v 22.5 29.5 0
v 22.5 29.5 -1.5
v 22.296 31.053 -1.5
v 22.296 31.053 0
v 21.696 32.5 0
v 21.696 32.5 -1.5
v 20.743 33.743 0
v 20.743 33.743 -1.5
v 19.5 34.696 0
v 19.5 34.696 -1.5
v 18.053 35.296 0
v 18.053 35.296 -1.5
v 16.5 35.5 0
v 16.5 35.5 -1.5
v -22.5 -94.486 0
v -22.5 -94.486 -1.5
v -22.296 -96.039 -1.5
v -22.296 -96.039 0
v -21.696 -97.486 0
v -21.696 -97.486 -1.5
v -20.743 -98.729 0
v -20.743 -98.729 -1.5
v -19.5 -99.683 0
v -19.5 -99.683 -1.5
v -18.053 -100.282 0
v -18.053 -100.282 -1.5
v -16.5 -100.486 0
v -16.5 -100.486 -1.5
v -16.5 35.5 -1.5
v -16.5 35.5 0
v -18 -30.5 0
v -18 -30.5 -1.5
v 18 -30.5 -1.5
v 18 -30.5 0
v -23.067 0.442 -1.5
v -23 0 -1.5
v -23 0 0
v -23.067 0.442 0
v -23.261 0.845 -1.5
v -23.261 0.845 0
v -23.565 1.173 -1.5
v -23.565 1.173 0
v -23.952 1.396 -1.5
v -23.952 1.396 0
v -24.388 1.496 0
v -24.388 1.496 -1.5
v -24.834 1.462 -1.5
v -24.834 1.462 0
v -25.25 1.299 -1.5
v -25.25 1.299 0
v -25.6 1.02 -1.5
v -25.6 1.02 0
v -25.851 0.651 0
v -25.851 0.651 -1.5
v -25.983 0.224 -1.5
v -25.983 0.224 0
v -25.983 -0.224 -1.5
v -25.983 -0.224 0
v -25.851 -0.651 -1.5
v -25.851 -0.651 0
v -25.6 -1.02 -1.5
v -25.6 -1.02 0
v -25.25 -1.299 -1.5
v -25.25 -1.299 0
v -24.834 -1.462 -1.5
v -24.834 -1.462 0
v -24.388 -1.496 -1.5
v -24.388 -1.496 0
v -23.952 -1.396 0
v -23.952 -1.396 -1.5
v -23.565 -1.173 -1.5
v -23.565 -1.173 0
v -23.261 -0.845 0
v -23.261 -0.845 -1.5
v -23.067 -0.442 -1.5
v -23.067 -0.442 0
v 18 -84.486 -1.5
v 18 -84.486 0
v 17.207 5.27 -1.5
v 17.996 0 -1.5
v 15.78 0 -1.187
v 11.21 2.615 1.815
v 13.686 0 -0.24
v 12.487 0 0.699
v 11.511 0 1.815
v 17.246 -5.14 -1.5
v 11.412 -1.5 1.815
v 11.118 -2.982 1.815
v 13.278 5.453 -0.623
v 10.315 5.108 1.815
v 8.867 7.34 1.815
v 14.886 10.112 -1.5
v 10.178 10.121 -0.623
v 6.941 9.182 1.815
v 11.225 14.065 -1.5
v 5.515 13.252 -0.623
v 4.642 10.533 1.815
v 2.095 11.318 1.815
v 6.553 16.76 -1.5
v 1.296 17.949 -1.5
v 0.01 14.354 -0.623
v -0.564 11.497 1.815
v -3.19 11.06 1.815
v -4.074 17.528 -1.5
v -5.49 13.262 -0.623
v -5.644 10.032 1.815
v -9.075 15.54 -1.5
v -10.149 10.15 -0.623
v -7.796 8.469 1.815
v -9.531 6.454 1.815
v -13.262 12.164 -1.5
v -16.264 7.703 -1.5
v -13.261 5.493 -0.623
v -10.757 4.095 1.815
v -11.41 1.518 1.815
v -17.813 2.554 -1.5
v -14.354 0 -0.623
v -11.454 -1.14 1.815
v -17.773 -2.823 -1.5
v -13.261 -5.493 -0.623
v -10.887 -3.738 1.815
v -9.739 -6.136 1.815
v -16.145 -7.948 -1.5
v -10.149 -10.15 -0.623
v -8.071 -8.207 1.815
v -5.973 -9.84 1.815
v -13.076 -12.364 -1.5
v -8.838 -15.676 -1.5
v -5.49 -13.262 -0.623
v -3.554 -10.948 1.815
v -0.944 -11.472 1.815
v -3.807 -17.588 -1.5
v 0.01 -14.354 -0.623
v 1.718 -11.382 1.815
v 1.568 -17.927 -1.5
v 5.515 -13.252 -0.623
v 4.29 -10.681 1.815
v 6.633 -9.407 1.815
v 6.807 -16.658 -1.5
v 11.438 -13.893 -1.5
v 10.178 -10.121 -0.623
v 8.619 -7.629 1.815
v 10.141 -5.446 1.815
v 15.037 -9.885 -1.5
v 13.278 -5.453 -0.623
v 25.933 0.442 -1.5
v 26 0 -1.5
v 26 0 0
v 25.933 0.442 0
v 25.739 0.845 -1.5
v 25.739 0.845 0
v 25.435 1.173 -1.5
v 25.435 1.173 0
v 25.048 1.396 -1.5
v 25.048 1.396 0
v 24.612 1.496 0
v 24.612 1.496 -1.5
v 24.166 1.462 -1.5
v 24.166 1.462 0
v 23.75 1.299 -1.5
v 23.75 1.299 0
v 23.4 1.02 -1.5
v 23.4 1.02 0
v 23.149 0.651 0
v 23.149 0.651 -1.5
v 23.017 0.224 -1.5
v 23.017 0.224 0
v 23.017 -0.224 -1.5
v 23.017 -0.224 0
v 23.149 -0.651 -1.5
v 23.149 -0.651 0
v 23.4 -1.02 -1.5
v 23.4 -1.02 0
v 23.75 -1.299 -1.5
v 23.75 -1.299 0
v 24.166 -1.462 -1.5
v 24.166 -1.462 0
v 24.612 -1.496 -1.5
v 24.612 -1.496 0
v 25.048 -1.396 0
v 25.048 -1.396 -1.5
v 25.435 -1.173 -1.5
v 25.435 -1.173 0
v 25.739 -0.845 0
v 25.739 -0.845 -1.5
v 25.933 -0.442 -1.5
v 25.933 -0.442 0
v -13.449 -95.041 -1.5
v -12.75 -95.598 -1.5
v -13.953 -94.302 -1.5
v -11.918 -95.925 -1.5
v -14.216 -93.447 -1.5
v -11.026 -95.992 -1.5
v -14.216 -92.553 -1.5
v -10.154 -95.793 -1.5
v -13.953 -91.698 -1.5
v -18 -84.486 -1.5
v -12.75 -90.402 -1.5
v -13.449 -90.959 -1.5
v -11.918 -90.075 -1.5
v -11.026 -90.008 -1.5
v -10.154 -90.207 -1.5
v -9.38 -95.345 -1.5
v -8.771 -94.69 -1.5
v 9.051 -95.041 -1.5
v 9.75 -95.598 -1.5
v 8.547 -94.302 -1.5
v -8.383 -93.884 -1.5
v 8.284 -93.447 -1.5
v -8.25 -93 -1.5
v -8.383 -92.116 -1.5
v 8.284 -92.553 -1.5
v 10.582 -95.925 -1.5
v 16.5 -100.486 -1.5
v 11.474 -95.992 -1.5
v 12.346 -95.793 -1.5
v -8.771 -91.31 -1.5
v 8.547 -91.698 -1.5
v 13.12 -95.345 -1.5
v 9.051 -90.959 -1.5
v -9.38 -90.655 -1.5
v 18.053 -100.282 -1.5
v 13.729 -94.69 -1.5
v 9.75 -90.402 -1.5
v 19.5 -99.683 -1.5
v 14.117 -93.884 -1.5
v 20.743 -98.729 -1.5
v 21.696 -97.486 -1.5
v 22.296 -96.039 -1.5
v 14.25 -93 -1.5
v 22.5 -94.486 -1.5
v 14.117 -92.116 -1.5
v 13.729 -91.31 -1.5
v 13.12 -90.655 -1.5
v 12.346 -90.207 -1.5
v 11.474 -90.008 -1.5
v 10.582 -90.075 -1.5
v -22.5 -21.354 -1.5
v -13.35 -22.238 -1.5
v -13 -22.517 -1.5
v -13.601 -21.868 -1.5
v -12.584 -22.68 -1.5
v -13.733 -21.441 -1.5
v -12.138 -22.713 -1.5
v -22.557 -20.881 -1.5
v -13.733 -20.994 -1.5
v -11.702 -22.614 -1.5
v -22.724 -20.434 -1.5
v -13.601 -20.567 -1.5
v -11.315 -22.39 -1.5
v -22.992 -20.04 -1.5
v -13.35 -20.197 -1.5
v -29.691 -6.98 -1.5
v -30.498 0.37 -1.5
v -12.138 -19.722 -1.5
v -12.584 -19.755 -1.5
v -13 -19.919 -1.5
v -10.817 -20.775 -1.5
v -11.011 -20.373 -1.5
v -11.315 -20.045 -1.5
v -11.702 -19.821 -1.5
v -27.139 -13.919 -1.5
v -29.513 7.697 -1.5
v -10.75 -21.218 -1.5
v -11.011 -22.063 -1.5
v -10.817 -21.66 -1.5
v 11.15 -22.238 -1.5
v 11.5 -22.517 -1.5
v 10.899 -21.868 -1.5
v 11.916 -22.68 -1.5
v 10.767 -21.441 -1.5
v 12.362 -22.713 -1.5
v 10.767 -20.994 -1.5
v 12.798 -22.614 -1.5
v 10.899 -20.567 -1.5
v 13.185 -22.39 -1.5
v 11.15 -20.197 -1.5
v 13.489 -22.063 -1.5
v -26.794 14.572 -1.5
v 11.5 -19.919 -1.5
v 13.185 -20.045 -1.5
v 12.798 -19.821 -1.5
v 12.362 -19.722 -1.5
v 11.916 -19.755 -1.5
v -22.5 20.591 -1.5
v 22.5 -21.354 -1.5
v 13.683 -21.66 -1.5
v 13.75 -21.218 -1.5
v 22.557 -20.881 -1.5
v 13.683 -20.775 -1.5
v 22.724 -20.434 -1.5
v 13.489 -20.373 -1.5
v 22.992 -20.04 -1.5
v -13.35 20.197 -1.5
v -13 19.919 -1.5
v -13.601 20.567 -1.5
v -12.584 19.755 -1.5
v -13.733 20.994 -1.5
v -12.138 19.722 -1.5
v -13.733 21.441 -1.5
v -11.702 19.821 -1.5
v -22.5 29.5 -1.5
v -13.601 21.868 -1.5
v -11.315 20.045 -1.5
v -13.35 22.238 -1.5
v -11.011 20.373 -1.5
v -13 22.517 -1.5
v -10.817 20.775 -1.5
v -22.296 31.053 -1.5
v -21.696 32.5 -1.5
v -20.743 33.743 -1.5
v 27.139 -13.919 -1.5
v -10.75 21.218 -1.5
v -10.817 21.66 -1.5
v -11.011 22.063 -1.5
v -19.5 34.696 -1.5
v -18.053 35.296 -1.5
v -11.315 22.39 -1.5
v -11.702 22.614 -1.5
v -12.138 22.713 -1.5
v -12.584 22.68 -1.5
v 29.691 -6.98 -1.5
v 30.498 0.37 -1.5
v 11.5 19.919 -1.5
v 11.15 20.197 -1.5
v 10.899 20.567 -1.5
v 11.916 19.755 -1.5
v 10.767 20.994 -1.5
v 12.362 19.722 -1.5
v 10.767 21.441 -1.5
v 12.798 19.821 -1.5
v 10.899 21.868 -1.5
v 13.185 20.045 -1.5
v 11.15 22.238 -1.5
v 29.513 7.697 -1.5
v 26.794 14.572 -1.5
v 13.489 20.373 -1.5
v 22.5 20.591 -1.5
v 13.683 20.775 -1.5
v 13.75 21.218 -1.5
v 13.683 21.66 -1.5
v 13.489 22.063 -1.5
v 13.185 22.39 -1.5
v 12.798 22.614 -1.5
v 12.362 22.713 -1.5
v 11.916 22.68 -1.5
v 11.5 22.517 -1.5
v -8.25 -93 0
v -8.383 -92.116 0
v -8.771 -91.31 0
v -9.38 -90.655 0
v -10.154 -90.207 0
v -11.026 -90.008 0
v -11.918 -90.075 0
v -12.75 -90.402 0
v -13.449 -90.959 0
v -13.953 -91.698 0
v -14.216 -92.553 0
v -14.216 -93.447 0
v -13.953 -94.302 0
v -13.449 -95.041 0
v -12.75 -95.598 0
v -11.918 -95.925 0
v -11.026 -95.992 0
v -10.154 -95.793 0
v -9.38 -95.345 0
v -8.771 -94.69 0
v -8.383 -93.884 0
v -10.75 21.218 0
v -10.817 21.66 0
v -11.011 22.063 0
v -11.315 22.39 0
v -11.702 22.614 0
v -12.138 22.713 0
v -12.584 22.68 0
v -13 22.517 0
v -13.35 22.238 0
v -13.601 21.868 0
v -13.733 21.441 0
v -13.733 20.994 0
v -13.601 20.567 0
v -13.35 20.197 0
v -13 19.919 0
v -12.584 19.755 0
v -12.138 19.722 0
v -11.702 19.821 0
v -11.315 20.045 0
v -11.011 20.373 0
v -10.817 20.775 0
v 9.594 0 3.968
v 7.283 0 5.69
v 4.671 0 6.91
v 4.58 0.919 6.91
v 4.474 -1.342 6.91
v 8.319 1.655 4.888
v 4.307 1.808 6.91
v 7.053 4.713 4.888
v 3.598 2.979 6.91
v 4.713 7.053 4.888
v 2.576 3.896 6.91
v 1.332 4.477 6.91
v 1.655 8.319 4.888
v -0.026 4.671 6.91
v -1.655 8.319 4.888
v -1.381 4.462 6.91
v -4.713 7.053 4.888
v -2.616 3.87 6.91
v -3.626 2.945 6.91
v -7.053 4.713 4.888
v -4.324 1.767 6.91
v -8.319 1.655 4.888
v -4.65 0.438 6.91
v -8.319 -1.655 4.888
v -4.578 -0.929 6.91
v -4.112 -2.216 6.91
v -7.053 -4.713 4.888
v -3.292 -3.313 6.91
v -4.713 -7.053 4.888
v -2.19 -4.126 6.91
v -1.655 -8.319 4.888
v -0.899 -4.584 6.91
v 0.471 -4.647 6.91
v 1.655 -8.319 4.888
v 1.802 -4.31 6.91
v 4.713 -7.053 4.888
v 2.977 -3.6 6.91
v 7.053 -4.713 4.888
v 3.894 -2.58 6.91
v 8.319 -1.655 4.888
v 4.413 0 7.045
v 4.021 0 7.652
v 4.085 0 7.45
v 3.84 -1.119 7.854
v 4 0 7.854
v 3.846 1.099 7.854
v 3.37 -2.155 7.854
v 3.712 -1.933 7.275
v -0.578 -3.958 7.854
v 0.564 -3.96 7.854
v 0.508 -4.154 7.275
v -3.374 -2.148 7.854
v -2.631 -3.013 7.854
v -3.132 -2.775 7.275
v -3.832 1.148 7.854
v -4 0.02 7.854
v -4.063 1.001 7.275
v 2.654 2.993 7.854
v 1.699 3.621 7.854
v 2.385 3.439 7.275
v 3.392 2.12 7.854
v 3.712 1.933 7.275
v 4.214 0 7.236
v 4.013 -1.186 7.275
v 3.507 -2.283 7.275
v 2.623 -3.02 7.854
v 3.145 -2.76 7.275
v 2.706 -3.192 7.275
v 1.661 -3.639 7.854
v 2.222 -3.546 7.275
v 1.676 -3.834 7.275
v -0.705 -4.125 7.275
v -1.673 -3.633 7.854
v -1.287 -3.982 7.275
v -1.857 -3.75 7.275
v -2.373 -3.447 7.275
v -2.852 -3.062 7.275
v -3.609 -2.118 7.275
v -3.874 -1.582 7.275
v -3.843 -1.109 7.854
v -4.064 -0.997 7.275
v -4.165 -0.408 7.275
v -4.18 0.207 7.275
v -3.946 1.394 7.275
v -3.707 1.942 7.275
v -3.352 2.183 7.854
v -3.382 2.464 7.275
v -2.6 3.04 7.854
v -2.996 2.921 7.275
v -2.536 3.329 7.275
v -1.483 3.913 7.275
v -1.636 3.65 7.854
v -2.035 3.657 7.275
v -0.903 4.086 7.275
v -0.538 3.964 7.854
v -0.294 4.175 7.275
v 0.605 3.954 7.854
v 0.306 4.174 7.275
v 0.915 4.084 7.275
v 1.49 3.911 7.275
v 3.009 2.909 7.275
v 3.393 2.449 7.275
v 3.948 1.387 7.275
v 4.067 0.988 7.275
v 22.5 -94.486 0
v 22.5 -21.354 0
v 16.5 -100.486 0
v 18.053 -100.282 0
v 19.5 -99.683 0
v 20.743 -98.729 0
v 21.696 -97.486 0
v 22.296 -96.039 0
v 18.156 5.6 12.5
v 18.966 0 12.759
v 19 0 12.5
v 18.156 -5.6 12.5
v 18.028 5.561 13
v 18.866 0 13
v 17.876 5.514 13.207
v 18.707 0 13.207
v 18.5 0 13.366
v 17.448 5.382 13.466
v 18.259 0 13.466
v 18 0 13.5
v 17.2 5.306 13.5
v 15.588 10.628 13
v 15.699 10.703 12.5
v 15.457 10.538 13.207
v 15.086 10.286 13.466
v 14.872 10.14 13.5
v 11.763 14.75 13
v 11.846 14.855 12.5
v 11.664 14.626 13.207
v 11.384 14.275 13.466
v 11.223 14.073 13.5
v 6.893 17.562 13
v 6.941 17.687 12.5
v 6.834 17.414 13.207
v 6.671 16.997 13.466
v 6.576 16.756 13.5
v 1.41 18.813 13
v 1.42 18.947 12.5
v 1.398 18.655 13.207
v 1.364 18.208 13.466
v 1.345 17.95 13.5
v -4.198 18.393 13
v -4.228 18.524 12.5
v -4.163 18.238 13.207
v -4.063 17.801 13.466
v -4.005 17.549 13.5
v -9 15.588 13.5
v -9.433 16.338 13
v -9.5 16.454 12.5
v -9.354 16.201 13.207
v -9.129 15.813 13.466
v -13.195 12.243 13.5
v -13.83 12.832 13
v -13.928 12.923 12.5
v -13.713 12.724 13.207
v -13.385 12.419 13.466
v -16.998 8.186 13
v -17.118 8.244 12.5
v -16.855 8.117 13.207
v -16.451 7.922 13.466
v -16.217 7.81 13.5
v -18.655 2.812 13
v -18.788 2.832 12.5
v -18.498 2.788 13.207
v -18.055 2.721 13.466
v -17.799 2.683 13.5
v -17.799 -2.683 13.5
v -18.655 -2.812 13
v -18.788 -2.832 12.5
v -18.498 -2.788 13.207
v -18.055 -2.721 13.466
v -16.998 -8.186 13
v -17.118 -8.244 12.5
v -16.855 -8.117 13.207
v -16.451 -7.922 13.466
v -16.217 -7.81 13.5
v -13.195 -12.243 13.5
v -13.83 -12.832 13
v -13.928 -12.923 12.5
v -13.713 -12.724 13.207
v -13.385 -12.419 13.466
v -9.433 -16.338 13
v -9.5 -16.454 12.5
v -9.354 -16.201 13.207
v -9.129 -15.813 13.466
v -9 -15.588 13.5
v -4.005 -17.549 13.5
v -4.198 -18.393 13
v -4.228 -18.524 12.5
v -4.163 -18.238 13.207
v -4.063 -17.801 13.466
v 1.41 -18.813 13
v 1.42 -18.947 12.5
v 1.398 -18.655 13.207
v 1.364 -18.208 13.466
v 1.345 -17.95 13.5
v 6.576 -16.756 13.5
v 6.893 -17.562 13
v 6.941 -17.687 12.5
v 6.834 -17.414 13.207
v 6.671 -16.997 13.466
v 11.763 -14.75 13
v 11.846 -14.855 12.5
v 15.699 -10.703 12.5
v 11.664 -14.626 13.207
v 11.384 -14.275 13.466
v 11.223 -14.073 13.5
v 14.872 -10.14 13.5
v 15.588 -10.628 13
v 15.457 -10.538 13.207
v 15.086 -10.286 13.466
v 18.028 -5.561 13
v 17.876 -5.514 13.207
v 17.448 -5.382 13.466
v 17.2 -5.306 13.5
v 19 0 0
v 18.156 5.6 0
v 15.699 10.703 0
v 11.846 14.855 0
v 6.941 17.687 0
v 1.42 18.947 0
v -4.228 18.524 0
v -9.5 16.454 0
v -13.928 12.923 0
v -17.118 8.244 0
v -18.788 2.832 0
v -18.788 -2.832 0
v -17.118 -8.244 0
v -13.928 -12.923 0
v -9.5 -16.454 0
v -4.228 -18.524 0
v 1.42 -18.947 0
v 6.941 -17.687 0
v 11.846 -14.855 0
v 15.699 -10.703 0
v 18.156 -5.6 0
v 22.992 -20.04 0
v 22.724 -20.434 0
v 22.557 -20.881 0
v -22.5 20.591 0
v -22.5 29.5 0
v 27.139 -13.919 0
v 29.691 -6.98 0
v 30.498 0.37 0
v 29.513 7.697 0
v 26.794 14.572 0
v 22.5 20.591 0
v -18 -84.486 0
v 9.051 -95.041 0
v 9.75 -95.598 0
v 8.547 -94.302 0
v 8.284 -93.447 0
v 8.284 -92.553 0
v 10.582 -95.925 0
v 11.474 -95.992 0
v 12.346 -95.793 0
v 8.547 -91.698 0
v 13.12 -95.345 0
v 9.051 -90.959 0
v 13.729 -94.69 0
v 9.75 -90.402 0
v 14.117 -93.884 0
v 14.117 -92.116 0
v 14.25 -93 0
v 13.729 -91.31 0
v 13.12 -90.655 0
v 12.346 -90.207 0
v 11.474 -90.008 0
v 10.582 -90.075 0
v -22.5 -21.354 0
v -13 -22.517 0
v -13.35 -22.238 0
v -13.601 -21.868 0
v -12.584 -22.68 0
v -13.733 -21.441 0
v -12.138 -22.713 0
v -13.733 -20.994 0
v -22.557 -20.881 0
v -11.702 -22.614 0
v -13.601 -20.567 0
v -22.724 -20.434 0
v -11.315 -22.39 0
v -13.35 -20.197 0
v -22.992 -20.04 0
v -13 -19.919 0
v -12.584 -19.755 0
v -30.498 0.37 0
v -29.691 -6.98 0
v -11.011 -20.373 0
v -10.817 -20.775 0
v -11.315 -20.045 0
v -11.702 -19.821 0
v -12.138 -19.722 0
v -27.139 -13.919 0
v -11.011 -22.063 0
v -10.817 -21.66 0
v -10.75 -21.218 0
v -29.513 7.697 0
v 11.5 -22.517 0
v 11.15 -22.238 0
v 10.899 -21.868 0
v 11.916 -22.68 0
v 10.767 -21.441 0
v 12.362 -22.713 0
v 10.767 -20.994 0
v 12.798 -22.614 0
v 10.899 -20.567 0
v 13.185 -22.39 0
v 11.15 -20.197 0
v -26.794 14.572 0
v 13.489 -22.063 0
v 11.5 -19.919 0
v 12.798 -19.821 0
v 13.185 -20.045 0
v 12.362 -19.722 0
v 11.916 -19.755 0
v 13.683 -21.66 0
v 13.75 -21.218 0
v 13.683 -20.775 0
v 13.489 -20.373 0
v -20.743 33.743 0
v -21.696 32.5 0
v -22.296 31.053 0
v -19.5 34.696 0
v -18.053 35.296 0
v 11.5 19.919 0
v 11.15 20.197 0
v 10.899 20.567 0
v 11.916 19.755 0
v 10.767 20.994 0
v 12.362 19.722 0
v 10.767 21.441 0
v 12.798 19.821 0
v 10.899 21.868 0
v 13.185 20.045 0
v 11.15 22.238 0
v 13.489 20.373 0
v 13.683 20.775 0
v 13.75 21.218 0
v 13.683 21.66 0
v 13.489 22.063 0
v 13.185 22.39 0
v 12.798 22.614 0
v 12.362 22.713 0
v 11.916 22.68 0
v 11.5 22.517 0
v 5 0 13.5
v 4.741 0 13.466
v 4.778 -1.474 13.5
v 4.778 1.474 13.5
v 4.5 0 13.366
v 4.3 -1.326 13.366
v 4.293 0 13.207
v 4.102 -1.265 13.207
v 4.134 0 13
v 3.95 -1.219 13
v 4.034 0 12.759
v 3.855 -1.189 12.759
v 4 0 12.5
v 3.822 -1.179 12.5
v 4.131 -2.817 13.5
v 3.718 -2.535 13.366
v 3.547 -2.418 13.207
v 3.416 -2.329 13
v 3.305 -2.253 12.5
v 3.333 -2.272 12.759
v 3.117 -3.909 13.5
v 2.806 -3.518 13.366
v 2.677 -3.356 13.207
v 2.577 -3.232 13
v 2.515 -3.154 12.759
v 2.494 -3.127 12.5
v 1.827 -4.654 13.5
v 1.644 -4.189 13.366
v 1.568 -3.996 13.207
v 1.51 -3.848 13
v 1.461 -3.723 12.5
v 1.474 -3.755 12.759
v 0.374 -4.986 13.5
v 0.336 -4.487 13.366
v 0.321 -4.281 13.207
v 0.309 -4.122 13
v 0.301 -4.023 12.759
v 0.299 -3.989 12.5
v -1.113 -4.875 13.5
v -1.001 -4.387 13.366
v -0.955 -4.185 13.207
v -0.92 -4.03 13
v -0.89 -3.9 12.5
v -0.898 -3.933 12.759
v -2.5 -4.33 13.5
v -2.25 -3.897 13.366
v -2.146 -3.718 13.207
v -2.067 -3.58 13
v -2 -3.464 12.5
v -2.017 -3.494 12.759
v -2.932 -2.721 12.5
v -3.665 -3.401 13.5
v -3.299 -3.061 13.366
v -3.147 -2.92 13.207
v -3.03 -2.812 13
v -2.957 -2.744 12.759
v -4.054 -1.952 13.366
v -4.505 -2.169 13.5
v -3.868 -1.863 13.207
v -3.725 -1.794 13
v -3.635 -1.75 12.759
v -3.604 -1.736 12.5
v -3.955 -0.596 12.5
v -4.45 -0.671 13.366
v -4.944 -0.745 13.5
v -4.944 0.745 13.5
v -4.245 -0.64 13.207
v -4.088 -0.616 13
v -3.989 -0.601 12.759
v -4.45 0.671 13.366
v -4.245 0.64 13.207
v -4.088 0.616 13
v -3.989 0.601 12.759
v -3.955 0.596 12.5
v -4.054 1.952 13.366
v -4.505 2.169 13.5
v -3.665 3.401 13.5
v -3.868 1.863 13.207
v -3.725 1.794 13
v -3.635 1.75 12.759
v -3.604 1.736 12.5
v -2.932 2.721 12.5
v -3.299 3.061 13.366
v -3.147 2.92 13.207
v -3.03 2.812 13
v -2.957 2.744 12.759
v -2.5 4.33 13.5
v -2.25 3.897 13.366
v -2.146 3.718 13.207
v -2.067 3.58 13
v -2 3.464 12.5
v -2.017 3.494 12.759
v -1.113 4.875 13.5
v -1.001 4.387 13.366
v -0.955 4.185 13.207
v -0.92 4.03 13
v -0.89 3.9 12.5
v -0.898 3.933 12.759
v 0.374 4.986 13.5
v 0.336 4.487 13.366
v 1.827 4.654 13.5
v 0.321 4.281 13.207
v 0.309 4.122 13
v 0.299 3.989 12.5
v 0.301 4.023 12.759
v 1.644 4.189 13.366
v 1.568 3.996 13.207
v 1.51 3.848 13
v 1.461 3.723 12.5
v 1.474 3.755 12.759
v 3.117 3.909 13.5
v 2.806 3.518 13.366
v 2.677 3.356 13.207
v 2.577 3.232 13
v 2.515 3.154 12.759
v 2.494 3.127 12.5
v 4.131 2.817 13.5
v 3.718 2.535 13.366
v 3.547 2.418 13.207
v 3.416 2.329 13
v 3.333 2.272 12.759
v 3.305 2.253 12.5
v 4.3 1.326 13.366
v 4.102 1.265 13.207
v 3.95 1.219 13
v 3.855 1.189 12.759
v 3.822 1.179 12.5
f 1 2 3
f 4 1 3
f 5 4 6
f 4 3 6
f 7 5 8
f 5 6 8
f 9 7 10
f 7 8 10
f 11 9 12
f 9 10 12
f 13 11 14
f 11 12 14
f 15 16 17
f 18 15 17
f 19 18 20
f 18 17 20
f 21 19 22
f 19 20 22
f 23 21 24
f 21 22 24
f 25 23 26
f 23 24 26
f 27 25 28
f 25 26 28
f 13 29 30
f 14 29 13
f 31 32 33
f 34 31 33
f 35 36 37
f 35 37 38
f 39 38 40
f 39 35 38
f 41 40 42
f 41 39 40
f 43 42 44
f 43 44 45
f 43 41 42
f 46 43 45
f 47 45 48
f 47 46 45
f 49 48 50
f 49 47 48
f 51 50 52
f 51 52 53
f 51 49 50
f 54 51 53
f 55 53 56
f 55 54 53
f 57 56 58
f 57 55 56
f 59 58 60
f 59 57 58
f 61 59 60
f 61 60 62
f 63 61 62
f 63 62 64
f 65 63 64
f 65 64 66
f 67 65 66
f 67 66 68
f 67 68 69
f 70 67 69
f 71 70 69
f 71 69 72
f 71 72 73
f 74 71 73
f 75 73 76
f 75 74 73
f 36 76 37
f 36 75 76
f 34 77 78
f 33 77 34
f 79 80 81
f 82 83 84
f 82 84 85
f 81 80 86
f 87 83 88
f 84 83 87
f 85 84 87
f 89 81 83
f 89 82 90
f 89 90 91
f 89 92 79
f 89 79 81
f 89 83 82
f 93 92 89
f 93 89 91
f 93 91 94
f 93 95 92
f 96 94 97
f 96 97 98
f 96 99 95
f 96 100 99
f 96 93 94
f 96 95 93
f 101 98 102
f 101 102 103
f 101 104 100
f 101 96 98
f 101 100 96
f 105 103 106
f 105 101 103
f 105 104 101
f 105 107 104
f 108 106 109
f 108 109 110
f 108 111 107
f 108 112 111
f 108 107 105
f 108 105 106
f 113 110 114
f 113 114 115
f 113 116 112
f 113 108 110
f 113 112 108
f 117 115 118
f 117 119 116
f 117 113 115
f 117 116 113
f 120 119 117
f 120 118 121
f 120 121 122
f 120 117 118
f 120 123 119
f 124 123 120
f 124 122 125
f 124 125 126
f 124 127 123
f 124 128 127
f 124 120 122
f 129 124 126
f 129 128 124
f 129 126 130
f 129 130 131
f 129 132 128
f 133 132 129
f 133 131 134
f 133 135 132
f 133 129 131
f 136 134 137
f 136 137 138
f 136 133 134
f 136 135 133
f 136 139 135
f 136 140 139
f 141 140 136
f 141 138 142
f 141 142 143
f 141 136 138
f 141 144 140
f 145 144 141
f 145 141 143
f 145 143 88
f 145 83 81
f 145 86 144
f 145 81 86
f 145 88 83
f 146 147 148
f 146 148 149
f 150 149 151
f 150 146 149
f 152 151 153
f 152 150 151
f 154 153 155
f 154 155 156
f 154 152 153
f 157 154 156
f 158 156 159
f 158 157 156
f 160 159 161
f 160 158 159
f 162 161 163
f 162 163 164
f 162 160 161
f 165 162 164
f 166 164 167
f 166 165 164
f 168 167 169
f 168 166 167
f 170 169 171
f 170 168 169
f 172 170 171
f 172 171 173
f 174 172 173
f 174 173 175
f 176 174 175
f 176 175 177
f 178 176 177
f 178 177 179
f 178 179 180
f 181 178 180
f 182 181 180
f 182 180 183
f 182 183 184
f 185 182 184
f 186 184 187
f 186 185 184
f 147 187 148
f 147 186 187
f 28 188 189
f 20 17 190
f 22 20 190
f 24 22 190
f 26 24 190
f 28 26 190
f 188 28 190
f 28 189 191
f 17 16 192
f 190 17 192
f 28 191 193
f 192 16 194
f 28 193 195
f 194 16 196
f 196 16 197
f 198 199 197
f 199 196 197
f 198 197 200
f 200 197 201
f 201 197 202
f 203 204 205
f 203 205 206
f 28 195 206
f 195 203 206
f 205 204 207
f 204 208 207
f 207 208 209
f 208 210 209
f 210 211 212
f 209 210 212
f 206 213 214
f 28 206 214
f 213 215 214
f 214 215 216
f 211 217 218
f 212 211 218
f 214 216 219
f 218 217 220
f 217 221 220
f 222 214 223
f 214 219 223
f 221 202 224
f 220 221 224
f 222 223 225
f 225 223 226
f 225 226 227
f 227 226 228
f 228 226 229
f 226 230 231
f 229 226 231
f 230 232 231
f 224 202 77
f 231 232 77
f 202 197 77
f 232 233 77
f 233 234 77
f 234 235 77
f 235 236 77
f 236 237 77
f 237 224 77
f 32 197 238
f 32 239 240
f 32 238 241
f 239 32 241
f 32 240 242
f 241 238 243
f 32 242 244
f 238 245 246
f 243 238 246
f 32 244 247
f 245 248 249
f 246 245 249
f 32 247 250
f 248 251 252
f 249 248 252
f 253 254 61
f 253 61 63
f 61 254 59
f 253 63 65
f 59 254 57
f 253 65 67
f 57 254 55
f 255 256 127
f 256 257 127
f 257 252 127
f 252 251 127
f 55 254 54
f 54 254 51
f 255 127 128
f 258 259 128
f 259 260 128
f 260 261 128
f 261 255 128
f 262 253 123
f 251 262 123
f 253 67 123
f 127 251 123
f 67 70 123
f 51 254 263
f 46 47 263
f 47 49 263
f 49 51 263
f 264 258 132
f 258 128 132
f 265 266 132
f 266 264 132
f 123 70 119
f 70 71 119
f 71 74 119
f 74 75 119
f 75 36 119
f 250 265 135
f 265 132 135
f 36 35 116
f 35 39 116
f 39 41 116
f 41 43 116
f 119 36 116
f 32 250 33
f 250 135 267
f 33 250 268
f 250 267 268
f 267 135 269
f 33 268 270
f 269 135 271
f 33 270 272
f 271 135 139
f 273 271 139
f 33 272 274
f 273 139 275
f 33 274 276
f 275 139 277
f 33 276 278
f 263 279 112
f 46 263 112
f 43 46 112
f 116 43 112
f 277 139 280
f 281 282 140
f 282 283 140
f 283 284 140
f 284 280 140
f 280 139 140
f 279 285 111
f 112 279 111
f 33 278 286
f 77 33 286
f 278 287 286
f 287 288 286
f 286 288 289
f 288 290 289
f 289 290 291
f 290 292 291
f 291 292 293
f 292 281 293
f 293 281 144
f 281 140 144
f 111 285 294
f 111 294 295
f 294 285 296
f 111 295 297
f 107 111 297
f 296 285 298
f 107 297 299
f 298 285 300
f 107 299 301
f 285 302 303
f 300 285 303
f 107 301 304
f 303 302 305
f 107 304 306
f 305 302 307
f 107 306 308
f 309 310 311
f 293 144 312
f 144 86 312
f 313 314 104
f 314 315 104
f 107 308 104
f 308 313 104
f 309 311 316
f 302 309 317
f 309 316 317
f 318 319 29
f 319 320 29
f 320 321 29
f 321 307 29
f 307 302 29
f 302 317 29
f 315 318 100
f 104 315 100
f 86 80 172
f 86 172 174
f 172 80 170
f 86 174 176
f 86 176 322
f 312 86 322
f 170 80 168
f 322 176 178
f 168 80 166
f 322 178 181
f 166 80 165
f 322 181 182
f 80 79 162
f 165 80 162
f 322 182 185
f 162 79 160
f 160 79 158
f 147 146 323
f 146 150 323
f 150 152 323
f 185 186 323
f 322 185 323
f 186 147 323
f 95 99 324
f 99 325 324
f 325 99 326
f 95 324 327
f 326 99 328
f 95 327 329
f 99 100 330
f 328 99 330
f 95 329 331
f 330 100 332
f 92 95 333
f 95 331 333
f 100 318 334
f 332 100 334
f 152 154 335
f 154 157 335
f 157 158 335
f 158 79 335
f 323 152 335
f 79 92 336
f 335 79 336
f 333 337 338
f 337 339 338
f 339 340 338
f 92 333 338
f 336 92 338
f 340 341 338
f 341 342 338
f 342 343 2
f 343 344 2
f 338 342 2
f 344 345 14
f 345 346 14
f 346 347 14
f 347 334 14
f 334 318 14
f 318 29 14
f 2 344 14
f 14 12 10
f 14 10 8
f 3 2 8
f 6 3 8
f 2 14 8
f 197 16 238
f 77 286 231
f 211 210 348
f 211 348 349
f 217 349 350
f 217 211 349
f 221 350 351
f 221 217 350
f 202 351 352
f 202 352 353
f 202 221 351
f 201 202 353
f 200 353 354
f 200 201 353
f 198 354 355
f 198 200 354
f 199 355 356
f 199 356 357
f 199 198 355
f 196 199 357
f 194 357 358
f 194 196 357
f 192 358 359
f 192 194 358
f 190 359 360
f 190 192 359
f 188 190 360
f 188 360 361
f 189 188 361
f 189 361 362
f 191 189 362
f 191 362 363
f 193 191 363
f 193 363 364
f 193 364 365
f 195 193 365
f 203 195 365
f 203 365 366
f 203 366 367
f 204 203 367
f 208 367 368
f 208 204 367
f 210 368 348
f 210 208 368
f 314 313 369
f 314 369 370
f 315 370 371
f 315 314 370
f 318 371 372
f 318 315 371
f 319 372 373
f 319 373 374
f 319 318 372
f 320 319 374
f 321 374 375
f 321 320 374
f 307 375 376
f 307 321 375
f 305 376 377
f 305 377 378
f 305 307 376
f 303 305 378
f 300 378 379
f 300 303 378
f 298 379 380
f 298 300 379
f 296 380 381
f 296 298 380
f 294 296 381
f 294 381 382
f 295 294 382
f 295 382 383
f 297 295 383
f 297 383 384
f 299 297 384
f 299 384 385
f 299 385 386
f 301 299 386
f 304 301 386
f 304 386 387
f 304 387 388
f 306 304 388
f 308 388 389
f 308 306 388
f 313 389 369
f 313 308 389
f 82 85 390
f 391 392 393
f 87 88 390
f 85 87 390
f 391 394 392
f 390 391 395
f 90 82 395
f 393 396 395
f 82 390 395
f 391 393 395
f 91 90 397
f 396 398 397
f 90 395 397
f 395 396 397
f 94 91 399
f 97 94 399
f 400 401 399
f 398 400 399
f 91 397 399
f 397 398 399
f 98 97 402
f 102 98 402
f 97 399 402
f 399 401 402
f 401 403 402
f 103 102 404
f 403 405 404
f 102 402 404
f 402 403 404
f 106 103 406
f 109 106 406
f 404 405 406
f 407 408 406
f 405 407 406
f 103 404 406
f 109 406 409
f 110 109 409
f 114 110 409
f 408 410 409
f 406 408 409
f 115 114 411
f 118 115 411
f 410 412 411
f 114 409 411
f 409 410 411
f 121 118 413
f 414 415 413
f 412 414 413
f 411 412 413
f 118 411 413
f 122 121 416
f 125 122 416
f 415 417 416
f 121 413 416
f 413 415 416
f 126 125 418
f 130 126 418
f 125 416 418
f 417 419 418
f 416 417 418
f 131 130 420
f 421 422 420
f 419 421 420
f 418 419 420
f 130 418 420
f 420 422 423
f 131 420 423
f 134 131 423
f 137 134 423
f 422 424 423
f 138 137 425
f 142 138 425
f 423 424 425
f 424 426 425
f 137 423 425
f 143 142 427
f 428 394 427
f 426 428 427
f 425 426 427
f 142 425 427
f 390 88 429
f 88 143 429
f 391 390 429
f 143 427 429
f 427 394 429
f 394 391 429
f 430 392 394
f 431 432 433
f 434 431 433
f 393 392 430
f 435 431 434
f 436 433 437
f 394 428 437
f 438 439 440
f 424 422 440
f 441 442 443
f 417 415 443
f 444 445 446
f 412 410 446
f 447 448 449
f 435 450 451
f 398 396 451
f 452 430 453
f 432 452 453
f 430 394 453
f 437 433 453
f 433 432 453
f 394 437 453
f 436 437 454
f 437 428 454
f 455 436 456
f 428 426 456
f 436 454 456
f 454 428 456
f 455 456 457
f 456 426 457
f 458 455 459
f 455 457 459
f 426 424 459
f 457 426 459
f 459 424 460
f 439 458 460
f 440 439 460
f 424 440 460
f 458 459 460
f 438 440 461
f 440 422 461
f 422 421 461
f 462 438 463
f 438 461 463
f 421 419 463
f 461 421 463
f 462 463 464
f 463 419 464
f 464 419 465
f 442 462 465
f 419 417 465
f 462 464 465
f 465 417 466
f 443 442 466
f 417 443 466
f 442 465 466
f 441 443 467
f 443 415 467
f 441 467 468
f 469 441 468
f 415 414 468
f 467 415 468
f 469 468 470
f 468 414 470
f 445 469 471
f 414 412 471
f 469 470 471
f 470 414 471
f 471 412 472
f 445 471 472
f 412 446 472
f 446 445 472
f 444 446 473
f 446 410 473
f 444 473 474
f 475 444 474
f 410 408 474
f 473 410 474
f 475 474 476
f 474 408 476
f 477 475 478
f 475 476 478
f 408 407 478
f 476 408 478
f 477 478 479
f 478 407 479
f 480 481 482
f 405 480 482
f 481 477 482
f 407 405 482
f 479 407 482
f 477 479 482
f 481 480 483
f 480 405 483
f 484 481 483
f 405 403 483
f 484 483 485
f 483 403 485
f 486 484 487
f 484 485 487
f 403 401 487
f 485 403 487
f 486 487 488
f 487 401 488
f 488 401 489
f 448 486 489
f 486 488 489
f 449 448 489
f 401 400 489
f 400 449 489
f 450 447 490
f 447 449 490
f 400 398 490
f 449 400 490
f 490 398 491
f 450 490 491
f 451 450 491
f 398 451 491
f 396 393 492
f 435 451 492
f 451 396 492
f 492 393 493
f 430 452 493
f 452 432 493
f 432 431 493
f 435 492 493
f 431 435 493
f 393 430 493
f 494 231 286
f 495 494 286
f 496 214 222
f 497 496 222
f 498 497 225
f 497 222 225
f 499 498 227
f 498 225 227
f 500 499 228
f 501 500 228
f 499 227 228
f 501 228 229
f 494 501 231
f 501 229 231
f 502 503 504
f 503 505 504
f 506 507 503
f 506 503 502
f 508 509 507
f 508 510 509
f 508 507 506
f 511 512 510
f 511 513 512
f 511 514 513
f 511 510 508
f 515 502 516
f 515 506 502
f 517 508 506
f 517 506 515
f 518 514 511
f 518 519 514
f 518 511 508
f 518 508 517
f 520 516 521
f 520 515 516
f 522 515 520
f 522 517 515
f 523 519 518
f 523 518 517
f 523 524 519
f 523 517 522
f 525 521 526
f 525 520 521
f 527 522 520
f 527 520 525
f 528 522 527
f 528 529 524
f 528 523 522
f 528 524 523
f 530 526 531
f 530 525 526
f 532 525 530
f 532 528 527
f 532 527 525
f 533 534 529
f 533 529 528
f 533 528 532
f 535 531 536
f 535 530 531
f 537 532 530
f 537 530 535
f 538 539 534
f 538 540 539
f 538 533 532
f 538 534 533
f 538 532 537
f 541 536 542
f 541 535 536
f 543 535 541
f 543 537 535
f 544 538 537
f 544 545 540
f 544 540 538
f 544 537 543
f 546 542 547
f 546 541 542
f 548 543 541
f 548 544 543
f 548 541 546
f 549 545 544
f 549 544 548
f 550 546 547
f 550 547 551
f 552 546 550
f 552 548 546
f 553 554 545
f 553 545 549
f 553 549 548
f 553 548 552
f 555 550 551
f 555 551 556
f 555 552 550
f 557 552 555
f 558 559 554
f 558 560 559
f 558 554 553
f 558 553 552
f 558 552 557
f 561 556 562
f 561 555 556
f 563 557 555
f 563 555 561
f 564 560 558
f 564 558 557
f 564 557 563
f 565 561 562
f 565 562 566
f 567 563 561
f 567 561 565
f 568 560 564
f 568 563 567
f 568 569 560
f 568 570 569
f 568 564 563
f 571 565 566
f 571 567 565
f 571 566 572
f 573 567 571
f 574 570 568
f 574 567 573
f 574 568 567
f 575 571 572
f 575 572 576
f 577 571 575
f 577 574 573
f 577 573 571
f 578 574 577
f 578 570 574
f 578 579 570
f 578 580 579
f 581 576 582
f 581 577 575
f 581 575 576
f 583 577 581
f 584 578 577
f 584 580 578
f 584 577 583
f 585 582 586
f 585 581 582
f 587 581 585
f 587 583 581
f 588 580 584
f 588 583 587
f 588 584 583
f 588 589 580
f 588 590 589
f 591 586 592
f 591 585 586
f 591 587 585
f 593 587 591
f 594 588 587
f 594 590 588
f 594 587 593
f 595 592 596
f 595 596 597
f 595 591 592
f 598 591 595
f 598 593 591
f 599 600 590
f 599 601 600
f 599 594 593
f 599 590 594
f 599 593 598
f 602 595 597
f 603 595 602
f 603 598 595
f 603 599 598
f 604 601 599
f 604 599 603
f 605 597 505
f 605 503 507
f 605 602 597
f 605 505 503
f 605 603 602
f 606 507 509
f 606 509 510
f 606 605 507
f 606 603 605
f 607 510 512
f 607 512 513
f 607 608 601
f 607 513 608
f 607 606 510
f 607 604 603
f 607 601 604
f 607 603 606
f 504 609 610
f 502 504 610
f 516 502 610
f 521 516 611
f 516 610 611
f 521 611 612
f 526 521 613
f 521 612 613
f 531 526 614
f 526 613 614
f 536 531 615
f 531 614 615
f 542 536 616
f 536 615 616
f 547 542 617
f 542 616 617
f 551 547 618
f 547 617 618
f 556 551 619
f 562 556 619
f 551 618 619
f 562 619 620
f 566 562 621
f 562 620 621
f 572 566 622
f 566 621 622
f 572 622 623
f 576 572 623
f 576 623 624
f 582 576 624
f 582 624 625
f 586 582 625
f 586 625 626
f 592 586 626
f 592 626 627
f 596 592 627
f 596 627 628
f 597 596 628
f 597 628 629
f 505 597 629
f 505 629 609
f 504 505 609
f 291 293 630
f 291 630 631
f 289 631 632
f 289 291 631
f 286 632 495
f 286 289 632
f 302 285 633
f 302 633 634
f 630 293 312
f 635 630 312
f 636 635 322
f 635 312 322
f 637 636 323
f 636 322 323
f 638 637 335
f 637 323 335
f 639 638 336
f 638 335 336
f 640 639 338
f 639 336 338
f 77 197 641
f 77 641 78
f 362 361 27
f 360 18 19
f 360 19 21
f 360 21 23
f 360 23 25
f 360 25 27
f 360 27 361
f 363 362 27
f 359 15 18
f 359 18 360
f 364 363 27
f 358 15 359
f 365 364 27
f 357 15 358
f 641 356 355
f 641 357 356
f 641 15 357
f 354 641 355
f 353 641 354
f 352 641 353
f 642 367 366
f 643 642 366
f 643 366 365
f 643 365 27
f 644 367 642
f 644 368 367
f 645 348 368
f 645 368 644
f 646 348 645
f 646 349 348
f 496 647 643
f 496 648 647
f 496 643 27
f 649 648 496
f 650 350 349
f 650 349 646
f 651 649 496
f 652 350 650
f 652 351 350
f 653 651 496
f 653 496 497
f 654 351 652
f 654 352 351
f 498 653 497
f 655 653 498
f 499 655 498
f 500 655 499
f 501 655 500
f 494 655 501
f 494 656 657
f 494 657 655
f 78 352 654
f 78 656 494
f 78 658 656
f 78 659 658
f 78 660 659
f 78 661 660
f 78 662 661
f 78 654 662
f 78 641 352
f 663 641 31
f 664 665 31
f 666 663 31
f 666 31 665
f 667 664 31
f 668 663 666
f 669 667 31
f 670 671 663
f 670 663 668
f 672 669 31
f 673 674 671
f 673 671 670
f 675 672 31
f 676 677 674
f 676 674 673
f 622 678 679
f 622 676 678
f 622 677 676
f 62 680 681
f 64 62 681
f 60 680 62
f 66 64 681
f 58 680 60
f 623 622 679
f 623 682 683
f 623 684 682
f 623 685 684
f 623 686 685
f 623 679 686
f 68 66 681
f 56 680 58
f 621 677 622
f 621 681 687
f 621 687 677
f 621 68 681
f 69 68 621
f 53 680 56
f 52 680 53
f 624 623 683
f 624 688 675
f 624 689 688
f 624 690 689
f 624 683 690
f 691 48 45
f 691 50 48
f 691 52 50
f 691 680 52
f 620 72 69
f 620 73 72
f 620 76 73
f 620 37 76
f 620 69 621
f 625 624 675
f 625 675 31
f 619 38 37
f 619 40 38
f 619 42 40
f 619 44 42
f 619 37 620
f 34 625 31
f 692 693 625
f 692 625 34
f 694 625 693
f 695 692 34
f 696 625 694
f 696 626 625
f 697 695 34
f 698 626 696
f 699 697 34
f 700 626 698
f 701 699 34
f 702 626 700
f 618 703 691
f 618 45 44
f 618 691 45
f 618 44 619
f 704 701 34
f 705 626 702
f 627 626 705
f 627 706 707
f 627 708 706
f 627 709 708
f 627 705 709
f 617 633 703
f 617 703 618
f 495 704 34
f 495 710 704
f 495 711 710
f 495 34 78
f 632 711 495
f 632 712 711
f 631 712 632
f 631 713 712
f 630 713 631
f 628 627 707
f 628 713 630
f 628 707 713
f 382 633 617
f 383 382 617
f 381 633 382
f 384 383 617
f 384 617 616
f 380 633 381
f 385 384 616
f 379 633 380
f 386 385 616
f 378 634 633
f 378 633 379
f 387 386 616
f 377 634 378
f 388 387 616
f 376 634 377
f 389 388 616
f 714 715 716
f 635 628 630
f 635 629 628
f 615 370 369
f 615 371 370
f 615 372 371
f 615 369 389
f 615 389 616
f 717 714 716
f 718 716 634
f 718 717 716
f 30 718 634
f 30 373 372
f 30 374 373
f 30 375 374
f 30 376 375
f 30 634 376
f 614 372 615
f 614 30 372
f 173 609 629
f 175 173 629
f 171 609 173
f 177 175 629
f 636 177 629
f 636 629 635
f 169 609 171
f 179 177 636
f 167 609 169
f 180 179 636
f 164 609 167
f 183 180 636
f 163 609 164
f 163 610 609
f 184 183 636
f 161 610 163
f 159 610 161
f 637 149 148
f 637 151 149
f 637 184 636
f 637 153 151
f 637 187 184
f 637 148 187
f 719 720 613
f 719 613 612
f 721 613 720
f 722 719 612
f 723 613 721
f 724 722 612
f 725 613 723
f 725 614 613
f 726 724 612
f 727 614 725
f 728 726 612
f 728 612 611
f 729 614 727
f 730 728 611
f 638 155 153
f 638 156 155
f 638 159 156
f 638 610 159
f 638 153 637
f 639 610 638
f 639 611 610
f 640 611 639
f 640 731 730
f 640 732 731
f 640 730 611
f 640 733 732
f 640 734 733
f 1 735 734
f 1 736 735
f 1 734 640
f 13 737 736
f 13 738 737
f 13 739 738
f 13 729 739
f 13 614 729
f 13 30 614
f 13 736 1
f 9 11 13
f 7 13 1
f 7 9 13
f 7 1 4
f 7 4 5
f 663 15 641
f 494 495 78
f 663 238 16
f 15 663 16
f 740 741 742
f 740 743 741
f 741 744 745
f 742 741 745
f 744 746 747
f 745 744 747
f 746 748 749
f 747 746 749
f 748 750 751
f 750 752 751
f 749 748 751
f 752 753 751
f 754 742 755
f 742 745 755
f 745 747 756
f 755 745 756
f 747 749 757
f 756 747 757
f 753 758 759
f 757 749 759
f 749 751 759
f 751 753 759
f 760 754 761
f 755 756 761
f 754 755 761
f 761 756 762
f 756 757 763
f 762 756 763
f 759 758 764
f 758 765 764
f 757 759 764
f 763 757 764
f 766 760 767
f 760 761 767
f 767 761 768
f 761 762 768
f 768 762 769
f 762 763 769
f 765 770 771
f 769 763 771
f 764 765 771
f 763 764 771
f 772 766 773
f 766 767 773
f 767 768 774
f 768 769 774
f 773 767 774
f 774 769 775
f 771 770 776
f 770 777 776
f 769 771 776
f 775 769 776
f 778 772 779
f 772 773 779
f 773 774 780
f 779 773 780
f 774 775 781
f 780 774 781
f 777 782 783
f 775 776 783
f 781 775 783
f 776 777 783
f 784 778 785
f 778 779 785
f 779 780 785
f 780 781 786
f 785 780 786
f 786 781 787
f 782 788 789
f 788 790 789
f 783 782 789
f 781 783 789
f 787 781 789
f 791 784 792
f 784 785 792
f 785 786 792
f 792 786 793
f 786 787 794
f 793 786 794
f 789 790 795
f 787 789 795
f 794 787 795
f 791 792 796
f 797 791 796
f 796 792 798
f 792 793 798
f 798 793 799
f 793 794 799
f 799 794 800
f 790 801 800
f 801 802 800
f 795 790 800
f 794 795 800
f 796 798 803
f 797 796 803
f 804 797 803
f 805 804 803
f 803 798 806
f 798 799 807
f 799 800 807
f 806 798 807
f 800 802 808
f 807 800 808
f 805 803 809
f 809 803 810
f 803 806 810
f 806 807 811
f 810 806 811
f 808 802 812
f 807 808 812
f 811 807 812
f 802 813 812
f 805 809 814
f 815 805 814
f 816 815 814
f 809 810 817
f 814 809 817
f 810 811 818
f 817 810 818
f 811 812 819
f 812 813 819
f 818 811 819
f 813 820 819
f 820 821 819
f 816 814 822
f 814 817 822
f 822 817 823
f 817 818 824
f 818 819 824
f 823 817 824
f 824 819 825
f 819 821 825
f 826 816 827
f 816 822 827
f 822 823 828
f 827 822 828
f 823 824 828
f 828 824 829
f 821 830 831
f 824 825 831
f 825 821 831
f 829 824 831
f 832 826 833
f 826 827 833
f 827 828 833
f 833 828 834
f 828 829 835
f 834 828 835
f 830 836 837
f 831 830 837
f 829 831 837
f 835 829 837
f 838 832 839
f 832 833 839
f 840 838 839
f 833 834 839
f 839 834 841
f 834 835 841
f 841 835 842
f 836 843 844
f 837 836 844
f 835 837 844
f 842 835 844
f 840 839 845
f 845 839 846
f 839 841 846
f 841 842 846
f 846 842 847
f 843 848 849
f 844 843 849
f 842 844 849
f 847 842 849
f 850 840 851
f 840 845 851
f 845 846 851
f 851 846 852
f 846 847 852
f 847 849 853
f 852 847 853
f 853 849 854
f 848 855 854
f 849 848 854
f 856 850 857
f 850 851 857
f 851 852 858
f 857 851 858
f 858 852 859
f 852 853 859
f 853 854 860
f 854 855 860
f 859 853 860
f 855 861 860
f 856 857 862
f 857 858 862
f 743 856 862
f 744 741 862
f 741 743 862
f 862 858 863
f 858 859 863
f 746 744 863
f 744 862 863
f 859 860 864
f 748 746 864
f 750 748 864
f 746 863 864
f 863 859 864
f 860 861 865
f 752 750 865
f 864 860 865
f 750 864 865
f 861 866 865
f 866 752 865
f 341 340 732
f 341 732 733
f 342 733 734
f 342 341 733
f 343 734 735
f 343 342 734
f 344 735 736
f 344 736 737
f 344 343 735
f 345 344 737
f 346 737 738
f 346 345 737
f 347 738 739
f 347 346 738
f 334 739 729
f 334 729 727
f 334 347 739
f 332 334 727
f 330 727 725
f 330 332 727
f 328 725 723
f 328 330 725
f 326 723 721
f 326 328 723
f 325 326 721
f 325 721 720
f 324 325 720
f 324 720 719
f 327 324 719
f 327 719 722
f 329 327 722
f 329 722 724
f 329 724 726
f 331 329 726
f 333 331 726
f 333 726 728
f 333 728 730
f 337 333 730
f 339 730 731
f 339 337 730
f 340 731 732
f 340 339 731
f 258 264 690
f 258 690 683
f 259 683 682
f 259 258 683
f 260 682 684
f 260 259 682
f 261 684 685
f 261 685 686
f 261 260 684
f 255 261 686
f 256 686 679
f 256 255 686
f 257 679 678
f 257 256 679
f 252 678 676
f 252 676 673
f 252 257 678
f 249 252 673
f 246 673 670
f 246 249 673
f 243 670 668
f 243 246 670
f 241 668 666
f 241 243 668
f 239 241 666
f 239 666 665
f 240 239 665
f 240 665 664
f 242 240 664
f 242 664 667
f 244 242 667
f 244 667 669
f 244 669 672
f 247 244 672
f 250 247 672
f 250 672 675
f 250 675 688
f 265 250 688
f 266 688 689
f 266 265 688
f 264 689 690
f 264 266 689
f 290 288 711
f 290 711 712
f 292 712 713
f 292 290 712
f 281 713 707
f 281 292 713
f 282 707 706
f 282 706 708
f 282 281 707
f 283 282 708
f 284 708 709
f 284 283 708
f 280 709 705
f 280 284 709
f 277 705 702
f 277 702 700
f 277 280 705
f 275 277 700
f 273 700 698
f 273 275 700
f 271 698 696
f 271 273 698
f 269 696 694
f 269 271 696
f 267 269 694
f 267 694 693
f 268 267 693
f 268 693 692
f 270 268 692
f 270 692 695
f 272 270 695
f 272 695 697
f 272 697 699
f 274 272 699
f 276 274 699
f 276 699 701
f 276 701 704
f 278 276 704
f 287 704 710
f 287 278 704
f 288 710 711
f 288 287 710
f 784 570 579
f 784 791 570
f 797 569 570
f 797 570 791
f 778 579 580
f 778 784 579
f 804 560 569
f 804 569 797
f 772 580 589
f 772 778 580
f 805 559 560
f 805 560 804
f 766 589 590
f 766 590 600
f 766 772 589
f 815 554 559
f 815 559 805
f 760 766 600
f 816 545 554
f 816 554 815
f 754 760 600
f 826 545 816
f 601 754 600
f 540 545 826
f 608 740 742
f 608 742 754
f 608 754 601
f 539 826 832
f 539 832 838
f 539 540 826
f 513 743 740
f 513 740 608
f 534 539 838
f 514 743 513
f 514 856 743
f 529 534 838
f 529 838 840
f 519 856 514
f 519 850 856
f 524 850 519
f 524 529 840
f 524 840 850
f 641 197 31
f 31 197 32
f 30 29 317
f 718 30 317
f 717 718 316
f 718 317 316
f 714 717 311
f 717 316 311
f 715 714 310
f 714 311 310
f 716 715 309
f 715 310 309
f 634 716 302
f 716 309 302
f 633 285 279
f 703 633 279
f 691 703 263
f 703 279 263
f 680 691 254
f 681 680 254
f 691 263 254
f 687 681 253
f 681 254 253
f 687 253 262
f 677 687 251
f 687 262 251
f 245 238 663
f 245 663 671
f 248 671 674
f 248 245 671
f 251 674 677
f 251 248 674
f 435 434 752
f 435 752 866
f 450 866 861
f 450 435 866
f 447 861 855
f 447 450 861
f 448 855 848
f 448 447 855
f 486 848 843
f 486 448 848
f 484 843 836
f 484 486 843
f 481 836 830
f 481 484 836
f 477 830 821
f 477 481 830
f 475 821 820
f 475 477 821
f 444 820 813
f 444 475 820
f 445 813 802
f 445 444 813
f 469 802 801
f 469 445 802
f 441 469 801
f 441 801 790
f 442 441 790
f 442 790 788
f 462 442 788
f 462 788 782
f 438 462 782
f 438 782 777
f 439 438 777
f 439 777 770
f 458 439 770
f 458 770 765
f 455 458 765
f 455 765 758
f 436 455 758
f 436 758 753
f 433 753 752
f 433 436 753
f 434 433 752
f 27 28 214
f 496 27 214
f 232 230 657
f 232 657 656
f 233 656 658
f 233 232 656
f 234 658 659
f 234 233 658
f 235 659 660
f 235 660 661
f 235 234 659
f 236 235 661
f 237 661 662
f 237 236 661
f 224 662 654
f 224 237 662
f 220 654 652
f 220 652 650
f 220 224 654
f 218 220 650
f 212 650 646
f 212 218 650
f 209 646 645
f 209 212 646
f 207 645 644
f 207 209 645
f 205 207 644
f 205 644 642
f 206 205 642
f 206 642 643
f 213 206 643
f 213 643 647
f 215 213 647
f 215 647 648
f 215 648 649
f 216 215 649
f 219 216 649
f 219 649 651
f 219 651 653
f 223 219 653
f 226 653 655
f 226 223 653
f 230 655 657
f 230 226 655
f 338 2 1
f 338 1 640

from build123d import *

# Parameters (mm, degrees)
CYLINDER010_R     = 19
CYLINDER010_DEPTH = 15
CYLINDER011_R     = 4
CYLINDER011_DEPTH = 18
SKETCH006_R       = 19
SKETCH006_R_2     = 3
SKETCH006_R_3     = 1.5
SKETCH006_W       = 36
SKETCH006_H       = 53.986387
PAD002_DEPTH      = 1.5
FILLET007_R       = 1
FILLET008_R       = 8


with BuildPart() as part:
    # Cylinder010 → Cylinder010 (join)
    with BuildSketch(Plane.XY):
        Circle(CYLINDER010_R)
    extrude(amount=CYLINDER010_DEPTH)

    # Sphere001 → Sphere001 (revolve, cut)
    with BuildSketch(Plane(origin=(0, 0, -5), x_dir=(1, 0, 0), z_dir=(0, -1, 0))):
        with BuildLine():
            ThreePointArc((0, -14.2), (14.2, 0), (0, 14.2))
            Line((0, 14.2), (0, -14.2))
        make_face()
    revolve(axis=Axis((0, 0, -5), (0, 0, 1)), mode=Mode.SUBTRACT)

    # Cylinder011 → Cylinder011 (cut)
    with BuildSketch(Plane.XY.offset(-2)):
        Circle(CYLINDER011_R)
    extrude(amount=CYLINDER011_DEPTH, mode=Mode.SUBTRACT)

    # Sketch006 → Pad002 (join)
    with BuildSketch(Plane.XY):
        with BuildLine():
            ThreePointArc((-22.5, 20.591260282), (-30.4977615184, 0.369516399), (-22.9922965207, -20.0400673827))
            ThreePointArc((-22.5, -21.3541501425), (-22.6271147127, -20.652515071), (-22.9922965208, -20.0400673827))
            Line((-22.5, -21.3541501425), (-22.5, -30.5))
            Line((-22.5, -30.5), (-22.5, -94.4863863704))
            ThreePointArc((-22.5, -94.4863863704), (-20.7426407961, -98.72902721), (-16.5000000467, -100.4863866319))
            Line((-16.5000000467, -100.4863866319), (16.5, -100.4863866319))
            ThreePointArc((16.5, -100.4863866319), (20.7426406871, -98.729027319), (22.5, -94.4863866319))
            Line((22.5, -94.4863866319), (22.5, -30.5))
            Line((22.5, -21.3541565041), (22.5, -30.5))
            ThreePointArc((22.9923076923, -20.0400545654), (22.6271165793, -20.6525100886), (22.5, -21.3541565041))
            ThreePointArc((22.9923076923, -20.0400545654), (30.4977614154, 0.3695248997), (22.5, 20.591260282))
            Line((22.5, 29.5), (22.5, 20.591260282))
            ThreePointArc((22.5, 29.5), (20.7426406871, 33.7426406871), (16.5, 35.5))
            Line((-16.5, 35.5), (16.5, 35.5))
            ThreePointArc((-16.5, 35.5), (-20.7426406871, 33.7426406871), (-22.5, 29.5))
            Line((-22.5, 20.591260282), (-22.5, 29.5))
        make_face()
        Circle(SKETCH006_R, mode=Mode.SUBTRACT)
        with Locations((-11.25, -93)):
            Circle(SKETCH006_R_2, mode=Mode.SUBTRACT)
        with Locations((11.25, -93)):
            Circle(SKETCH006_R_2, mode=Mode.SUBTRACT)
        with Locations((-12.25, 21.217622)):
            Circle(SKETCH006_R_3, mode=Mode.SUBTRACT)
        with Locations((12.25, 21.217622)):
            Circle(SKETCH006_R_3, mode=Mode.SUBTRACT)
        with Locations((24.5, 0)):
            Circle(SKETCH006_R_3, mode=Mode.SUBTRACT)
        with Locations((-24.5, 0)):
            Circle(SKETCH006_R_3, mode=Mode.SUBTRACT)
        with Locations((-12.25, -21.217622)):
            Circle(SKETCH006_R_3, mode=Mode.SUBTRACT)
        with Locations((12.25, -21.217622)):
            Circle(SKETCH006_R_3, mode=Mode.SUBTRACT)
        with Locations((0, -57.4931935)):
            Rectangle(SKETCH006_W, SKETCH006_H, mode=Mode.SUBTRACT)
    extrude(amount=PAD002_DEPTH)

    # Fillet007
    fillet007_edges = [part.edges().sort_by_distance(p)[0] for p in [
        (-19, 0, 15),
        (-4, 0, 15),
        (-4, 0, 8.624977),
    ]]
    fillet(fillet007_edges, radius=FILLET007_R)

    # Fillet008
    fillet008_edges = [part.edges().sort_by_distance(p)[0] for p in [
        (-13.290598, 0, 0),
    ]]
    fillet(fillet008_edges, radius=FILLET008_R)


with BuildPart() as part_1:
    # Body003 placement: moved
    add(part.part.moved(Location((0, 0, -1.5))))


solid = part_1.part
